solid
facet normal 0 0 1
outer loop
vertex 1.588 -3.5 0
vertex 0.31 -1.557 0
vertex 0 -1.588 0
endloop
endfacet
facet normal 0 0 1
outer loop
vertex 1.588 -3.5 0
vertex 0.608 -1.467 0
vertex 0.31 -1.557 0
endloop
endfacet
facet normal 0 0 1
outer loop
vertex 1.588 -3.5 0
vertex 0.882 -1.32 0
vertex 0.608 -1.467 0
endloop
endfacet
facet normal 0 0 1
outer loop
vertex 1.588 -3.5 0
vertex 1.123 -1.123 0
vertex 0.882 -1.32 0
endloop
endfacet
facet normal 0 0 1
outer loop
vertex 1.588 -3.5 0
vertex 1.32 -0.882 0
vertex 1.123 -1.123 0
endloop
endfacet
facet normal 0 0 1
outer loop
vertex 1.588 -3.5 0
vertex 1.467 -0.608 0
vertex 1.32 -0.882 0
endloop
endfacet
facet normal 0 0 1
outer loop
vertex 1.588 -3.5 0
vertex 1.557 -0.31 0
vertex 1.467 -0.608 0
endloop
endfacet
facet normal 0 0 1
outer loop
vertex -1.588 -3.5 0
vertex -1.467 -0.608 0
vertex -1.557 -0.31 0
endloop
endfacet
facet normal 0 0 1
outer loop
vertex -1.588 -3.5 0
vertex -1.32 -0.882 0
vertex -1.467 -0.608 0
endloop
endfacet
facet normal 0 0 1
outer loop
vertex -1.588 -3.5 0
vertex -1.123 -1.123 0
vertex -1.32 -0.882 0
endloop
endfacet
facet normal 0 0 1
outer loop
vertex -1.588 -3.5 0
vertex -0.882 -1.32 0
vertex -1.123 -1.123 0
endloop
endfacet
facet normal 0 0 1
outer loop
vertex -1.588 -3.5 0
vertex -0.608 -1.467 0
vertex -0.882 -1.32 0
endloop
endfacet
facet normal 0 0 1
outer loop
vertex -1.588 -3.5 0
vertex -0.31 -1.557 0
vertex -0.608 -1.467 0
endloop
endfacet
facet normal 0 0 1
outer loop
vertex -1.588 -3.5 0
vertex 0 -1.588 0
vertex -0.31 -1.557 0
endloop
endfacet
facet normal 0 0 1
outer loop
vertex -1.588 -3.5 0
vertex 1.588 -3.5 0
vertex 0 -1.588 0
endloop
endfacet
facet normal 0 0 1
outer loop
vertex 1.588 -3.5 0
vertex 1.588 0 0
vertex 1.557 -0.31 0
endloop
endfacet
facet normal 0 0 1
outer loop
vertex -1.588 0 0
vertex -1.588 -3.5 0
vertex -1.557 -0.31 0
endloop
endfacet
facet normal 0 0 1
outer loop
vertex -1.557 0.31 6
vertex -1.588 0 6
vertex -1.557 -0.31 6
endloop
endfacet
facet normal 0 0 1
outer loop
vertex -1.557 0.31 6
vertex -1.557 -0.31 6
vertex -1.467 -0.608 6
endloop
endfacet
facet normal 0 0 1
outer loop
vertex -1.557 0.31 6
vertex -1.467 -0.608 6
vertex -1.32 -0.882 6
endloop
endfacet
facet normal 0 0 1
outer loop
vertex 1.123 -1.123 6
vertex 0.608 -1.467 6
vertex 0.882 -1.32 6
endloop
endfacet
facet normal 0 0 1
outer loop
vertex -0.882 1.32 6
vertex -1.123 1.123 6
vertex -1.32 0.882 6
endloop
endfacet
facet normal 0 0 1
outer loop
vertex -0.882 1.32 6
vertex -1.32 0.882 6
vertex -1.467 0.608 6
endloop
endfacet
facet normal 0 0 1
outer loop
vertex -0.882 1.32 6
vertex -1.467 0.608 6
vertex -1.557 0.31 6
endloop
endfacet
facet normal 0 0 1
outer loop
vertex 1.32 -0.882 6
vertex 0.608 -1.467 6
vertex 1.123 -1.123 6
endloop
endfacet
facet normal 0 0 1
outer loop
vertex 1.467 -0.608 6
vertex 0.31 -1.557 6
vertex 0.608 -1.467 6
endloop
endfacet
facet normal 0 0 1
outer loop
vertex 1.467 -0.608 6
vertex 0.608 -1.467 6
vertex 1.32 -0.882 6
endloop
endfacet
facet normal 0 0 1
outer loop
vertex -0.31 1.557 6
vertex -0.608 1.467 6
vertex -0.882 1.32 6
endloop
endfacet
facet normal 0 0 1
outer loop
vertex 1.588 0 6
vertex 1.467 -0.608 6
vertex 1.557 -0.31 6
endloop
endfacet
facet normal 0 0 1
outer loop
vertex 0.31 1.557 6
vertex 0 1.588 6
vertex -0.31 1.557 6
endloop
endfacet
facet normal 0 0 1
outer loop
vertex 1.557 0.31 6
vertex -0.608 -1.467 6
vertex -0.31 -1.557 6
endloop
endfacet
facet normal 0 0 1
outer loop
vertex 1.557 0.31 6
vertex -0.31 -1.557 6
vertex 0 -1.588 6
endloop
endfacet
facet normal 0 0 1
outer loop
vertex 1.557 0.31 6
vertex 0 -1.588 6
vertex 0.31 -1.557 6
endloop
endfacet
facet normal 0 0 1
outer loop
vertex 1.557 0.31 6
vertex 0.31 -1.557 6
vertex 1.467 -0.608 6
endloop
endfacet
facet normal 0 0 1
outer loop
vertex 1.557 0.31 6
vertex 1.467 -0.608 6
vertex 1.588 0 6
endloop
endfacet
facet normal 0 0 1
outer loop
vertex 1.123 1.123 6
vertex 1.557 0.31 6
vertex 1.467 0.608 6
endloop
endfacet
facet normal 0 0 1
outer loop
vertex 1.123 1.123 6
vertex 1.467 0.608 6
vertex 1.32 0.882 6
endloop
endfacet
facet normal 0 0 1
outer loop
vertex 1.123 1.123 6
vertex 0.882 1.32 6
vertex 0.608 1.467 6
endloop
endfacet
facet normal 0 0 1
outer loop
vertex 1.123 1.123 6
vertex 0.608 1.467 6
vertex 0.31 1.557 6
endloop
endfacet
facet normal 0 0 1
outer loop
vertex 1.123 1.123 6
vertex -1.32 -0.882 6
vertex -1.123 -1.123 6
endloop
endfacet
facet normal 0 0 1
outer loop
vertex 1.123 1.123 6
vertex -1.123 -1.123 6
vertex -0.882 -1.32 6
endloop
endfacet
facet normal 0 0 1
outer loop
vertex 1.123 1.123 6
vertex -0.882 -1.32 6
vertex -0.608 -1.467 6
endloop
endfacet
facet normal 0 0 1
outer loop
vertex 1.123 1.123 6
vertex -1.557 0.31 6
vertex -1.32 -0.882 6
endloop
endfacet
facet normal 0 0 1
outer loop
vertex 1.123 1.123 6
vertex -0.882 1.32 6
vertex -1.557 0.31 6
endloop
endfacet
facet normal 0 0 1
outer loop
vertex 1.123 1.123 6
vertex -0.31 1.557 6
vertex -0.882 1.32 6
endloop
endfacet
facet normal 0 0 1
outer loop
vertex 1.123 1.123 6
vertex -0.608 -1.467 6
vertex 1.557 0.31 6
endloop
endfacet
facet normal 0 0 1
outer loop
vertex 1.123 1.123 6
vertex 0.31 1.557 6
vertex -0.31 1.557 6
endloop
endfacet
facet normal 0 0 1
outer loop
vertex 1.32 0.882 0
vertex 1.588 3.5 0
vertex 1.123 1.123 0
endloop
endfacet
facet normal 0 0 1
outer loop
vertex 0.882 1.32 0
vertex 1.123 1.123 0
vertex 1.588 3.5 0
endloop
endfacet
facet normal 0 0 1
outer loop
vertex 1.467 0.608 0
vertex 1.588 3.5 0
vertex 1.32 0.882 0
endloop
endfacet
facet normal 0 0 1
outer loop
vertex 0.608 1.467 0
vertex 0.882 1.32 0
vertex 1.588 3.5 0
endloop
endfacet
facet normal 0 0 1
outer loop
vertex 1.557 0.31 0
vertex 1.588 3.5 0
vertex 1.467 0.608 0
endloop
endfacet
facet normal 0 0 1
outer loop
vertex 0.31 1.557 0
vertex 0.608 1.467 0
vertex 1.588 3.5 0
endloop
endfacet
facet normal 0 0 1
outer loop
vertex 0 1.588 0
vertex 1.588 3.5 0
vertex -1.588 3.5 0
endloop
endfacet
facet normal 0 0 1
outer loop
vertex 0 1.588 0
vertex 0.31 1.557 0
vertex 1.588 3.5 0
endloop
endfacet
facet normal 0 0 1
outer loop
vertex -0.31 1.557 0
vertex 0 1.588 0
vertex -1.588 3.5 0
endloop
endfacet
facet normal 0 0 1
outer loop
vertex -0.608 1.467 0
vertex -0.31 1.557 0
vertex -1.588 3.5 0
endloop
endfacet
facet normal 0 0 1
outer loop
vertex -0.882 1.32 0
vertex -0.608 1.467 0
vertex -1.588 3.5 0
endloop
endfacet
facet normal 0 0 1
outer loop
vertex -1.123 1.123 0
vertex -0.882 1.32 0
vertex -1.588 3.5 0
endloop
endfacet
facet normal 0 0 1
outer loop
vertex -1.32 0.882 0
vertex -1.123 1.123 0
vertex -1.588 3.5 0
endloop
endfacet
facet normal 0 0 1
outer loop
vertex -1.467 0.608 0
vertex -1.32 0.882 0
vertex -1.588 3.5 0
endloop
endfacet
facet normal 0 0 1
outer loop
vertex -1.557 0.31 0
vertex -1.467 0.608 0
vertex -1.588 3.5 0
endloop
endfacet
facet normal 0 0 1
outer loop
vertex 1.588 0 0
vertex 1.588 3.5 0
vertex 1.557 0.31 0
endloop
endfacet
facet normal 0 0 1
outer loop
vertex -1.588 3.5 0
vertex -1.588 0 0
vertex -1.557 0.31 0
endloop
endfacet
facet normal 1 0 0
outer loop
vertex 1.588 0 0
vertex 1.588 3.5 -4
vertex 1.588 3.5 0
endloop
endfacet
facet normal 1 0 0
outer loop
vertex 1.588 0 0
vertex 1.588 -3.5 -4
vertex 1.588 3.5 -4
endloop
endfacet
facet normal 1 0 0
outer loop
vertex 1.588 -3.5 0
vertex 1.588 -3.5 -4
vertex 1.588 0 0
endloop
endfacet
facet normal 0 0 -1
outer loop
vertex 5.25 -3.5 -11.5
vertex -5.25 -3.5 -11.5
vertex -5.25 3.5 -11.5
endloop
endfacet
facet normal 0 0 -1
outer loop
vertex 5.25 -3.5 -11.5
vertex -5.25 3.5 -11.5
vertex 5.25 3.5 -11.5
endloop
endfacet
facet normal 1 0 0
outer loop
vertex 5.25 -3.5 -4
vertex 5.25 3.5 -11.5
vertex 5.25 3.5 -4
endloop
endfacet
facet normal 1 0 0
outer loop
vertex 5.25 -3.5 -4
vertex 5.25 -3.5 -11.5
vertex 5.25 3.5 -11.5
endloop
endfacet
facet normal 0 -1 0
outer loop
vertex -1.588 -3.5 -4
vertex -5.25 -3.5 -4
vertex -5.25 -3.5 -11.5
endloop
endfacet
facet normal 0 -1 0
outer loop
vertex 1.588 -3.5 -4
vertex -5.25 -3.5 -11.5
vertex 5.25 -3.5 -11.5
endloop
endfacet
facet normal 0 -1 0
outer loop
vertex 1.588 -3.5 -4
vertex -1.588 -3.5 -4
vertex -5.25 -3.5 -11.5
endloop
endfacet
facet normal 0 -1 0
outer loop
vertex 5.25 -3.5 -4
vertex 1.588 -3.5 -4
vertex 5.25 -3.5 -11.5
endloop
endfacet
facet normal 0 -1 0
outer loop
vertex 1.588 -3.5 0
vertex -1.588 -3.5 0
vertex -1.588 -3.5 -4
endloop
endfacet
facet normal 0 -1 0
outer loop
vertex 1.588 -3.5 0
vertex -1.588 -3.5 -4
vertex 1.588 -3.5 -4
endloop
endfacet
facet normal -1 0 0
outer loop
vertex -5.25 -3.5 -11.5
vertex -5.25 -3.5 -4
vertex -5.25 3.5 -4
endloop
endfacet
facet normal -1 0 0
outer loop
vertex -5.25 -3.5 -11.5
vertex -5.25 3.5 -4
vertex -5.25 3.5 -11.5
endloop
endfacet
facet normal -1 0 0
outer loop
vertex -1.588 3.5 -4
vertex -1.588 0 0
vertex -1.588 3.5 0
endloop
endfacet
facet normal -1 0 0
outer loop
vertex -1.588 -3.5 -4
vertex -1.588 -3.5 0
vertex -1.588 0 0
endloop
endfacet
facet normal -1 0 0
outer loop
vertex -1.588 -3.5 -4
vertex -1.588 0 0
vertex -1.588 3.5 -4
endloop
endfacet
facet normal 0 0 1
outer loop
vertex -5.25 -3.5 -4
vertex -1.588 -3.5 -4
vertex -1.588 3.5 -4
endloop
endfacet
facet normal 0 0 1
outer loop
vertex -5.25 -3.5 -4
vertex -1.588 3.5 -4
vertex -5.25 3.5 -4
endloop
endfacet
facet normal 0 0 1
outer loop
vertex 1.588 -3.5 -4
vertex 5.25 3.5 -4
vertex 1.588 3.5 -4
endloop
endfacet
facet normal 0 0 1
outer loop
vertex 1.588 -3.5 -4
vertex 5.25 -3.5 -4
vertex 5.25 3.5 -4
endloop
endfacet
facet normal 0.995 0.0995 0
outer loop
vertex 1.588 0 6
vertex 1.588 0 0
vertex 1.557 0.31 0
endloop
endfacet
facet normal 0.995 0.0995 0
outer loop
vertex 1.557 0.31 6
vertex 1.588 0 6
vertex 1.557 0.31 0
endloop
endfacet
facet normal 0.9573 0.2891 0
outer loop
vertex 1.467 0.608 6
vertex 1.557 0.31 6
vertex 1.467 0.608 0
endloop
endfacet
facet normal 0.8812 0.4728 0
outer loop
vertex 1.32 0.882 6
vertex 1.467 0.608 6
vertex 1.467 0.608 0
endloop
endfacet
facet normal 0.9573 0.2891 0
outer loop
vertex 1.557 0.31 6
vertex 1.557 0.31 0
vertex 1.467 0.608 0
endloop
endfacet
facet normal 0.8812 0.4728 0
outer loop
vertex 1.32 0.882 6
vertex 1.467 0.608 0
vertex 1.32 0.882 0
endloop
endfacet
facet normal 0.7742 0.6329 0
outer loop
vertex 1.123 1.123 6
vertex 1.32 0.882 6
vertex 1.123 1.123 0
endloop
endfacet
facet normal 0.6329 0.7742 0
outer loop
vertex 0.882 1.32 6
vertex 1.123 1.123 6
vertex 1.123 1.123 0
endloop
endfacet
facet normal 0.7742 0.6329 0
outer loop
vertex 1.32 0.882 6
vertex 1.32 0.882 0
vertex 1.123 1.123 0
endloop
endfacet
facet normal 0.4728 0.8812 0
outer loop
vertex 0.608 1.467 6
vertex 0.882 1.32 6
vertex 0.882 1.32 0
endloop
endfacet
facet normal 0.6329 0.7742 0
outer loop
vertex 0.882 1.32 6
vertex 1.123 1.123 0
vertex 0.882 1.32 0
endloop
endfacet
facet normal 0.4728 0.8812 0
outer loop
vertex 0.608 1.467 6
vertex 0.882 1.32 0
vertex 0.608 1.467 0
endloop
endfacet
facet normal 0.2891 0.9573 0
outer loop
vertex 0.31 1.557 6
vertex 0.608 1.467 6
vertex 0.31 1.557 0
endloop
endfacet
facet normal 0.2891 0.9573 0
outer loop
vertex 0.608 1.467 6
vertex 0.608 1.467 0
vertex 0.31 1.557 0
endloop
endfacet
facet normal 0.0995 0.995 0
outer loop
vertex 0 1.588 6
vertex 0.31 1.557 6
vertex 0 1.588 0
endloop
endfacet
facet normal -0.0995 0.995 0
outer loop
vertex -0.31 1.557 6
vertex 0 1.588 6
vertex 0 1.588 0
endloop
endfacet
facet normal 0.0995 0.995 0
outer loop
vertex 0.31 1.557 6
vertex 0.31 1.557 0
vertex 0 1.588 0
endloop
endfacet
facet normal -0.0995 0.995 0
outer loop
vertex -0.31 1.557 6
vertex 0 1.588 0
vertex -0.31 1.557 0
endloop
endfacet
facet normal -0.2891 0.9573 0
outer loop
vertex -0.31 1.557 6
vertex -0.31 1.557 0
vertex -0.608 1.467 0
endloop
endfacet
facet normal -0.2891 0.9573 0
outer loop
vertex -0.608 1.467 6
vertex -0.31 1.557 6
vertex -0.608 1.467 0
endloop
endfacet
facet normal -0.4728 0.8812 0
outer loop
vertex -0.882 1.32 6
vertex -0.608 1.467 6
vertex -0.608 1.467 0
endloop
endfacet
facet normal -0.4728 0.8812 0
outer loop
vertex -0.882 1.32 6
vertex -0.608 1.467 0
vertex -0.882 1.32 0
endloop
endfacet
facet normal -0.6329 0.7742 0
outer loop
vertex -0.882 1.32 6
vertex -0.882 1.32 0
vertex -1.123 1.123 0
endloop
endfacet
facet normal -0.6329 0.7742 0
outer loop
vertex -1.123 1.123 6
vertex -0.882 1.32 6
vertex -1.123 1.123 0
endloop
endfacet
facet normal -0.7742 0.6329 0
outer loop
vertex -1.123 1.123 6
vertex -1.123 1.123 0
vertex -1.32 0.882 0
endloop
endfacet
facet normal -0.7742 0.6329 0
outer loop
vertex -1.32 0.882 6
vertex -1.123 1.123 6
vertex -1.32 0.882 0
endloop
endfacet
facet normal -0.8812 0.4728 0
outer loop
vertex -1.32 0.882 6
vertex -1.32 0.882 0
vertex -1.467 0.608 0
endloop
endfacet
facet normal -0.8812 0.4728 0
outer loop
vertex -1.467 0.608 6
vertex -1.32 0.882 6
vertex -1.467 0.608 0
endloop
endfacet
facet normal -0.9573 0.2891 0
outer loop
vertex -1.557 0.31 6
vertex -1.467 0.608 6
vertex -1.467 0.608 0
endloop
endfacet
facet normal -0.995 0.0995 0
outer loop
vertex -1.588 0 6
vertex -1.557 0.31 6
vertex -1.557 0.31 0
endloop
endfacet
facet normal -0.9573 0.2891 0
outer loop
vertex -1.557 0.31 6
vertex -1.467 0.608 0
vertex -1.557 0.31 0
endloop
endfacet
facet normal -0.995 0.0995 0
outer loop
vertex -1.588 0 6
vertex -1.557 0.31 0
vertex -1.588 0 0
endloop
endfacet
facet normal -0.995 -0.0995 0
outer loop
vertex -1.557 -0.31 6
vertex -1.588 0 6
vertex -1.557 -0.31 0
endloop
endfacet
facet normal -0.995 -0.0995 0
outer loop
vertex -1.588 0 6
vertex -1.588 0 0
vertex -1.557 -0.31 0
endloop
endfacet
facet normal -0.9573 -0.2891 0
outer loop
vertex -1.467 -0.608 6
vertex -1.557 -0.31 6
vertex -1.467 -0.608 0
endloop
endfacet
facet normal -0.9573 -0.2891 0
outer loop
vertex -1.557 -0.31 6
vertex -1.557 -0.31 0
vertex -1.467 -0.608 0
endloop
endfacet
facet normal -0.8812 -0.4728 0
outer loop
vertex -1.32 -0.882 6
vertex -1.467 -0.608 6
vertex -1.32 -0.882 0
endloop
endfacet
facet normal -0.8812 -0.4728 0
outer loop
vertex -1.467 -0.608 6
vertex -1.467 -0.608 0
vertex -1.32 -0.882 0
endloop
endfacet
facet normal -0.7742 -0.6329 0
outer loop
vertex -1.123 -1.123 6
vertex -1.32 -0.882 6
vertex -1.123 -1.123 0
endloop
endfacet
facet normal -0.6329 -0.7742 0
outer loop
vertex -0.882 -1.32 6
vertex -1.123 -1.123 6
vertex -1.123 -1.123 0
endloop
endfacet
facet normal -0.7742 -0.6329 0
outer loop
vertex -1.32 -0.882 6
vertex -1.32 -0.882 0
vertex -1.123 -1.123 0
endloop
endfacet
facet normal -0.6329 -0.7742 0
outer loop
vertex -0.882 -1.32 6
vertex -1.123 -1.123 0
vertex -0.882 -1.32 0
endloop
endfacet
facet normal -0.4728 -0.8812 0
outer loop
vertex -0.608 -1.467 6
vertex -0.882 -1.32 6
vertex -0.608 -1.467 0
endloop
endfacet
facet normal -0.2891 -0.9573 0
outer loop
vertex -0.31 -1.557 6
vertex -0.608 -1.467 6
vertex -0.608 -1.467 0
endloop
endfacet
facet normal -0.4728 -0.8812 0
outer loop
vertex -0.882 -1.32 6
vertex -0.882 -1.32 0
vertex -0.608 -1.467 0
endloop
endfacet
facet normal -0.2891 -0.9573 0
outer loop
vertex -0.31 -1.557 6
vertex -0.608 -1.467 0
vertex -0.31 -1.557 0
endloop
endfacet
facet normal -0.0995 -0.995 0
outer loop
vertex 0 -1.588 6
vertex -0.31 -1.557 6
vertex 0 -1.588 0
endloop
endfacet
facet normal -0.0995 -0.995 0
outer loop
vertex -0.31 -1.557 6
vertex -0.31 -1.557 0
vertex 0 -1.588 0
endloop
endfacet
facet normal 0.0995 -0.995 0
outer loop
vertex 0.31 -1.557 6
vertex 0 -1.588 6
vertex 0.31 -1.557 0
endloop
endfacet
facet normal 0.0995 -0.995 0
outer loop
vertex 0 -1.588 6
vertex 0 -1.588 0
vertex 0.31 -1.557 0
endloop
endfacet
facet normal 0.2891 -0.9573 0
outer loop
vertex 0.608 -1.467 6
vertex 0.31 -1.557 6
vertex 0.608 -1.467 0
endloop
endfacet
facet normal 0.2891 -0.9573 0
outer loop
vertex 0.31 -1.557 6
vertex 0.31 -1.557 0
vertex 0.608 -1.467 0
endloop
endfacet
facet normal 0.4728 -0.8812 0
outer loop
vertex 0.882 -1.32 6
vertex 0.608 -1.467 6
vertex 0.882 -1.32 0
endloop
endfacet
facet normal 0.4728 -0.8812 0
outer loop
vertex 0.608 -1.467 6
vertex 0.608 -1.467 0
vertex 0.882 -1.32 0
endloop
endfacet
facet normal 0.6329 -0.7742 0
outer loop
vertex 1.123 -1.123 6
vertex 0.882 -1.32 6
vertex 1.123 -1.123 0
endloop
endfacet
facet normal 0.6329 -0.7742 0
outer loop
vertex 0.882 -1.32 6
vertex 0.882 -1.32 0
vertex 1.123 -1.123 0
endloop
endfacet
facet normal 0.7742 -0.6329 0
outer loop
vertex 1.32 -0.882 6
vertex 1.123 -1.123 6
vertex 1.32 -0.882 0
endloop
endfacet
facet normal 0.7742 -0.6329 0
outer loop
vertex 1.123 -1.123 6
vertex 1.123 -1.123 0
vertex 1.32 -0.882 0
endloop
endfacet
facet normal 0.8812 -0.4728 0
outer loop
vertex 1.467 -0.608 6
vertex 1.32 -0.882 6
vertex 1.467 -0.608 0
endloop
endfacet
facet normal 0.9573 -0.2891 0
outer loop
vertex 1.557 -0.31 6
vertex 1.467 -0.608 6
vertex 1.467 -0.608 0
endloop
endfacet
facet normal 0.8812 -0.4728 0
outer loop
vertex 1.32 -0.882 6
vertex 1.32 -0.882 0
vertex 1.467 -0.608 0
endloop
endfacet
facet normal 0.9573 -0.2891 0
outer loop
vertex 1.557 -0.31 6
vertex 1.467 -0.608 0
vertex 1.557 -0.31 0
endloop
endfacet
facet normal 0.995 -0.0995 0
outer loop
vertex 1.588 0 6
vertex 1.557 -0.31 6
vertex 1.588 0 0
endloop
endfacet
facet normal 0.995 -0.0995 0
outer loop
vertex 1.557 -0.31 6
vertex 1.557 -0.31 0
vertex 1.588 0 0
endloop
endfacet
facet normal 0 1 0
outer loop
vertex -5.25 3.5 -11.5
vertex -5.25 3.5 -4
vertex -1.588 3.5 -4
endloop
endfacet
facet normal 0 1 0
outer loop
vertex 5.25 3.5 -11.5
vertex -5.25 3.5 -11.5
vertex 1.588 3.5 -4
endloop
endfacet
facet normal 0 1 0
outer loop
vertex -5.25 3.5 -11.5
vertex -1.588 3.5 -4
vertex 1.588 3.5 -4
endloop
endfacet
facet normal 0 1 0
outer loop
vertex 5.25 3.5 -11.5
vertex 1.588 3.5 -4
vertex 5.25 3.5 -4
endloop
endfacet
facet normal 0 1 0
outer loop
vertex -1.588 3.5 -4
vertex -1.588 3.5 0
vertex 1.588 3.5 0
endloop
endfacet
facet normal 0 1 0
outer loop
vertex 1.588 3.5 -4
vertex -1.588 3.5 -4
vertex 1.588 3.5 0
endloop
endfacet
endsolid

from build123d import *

# Parameters (mm, degrees)
F2_DEPTH = 3.5
F3_R     = 1.5875
F4_DEPTH = 6


with BuildPart() as f2:
    # F1 (on Front) → F2 (new body, symmetric)
    with BuildSketch(Plane.XZ):
        Polygon((1.5875, -4), (1.5875, 0), (-1.5875, 0), (-1.5875, -4), (-5.25, -4), (-5.25, -11.5), (5.25, -11.5), (5.25, -4), align=None)
    extrude(amount=F2_DEPTH, both=True)

    # F3 (on Top) → F4 (join)
    with BuildSketch(Plane.XY):
        Circle(F3_R)
    extrude(amount=F4_DEPTH)


solid = f2.part
